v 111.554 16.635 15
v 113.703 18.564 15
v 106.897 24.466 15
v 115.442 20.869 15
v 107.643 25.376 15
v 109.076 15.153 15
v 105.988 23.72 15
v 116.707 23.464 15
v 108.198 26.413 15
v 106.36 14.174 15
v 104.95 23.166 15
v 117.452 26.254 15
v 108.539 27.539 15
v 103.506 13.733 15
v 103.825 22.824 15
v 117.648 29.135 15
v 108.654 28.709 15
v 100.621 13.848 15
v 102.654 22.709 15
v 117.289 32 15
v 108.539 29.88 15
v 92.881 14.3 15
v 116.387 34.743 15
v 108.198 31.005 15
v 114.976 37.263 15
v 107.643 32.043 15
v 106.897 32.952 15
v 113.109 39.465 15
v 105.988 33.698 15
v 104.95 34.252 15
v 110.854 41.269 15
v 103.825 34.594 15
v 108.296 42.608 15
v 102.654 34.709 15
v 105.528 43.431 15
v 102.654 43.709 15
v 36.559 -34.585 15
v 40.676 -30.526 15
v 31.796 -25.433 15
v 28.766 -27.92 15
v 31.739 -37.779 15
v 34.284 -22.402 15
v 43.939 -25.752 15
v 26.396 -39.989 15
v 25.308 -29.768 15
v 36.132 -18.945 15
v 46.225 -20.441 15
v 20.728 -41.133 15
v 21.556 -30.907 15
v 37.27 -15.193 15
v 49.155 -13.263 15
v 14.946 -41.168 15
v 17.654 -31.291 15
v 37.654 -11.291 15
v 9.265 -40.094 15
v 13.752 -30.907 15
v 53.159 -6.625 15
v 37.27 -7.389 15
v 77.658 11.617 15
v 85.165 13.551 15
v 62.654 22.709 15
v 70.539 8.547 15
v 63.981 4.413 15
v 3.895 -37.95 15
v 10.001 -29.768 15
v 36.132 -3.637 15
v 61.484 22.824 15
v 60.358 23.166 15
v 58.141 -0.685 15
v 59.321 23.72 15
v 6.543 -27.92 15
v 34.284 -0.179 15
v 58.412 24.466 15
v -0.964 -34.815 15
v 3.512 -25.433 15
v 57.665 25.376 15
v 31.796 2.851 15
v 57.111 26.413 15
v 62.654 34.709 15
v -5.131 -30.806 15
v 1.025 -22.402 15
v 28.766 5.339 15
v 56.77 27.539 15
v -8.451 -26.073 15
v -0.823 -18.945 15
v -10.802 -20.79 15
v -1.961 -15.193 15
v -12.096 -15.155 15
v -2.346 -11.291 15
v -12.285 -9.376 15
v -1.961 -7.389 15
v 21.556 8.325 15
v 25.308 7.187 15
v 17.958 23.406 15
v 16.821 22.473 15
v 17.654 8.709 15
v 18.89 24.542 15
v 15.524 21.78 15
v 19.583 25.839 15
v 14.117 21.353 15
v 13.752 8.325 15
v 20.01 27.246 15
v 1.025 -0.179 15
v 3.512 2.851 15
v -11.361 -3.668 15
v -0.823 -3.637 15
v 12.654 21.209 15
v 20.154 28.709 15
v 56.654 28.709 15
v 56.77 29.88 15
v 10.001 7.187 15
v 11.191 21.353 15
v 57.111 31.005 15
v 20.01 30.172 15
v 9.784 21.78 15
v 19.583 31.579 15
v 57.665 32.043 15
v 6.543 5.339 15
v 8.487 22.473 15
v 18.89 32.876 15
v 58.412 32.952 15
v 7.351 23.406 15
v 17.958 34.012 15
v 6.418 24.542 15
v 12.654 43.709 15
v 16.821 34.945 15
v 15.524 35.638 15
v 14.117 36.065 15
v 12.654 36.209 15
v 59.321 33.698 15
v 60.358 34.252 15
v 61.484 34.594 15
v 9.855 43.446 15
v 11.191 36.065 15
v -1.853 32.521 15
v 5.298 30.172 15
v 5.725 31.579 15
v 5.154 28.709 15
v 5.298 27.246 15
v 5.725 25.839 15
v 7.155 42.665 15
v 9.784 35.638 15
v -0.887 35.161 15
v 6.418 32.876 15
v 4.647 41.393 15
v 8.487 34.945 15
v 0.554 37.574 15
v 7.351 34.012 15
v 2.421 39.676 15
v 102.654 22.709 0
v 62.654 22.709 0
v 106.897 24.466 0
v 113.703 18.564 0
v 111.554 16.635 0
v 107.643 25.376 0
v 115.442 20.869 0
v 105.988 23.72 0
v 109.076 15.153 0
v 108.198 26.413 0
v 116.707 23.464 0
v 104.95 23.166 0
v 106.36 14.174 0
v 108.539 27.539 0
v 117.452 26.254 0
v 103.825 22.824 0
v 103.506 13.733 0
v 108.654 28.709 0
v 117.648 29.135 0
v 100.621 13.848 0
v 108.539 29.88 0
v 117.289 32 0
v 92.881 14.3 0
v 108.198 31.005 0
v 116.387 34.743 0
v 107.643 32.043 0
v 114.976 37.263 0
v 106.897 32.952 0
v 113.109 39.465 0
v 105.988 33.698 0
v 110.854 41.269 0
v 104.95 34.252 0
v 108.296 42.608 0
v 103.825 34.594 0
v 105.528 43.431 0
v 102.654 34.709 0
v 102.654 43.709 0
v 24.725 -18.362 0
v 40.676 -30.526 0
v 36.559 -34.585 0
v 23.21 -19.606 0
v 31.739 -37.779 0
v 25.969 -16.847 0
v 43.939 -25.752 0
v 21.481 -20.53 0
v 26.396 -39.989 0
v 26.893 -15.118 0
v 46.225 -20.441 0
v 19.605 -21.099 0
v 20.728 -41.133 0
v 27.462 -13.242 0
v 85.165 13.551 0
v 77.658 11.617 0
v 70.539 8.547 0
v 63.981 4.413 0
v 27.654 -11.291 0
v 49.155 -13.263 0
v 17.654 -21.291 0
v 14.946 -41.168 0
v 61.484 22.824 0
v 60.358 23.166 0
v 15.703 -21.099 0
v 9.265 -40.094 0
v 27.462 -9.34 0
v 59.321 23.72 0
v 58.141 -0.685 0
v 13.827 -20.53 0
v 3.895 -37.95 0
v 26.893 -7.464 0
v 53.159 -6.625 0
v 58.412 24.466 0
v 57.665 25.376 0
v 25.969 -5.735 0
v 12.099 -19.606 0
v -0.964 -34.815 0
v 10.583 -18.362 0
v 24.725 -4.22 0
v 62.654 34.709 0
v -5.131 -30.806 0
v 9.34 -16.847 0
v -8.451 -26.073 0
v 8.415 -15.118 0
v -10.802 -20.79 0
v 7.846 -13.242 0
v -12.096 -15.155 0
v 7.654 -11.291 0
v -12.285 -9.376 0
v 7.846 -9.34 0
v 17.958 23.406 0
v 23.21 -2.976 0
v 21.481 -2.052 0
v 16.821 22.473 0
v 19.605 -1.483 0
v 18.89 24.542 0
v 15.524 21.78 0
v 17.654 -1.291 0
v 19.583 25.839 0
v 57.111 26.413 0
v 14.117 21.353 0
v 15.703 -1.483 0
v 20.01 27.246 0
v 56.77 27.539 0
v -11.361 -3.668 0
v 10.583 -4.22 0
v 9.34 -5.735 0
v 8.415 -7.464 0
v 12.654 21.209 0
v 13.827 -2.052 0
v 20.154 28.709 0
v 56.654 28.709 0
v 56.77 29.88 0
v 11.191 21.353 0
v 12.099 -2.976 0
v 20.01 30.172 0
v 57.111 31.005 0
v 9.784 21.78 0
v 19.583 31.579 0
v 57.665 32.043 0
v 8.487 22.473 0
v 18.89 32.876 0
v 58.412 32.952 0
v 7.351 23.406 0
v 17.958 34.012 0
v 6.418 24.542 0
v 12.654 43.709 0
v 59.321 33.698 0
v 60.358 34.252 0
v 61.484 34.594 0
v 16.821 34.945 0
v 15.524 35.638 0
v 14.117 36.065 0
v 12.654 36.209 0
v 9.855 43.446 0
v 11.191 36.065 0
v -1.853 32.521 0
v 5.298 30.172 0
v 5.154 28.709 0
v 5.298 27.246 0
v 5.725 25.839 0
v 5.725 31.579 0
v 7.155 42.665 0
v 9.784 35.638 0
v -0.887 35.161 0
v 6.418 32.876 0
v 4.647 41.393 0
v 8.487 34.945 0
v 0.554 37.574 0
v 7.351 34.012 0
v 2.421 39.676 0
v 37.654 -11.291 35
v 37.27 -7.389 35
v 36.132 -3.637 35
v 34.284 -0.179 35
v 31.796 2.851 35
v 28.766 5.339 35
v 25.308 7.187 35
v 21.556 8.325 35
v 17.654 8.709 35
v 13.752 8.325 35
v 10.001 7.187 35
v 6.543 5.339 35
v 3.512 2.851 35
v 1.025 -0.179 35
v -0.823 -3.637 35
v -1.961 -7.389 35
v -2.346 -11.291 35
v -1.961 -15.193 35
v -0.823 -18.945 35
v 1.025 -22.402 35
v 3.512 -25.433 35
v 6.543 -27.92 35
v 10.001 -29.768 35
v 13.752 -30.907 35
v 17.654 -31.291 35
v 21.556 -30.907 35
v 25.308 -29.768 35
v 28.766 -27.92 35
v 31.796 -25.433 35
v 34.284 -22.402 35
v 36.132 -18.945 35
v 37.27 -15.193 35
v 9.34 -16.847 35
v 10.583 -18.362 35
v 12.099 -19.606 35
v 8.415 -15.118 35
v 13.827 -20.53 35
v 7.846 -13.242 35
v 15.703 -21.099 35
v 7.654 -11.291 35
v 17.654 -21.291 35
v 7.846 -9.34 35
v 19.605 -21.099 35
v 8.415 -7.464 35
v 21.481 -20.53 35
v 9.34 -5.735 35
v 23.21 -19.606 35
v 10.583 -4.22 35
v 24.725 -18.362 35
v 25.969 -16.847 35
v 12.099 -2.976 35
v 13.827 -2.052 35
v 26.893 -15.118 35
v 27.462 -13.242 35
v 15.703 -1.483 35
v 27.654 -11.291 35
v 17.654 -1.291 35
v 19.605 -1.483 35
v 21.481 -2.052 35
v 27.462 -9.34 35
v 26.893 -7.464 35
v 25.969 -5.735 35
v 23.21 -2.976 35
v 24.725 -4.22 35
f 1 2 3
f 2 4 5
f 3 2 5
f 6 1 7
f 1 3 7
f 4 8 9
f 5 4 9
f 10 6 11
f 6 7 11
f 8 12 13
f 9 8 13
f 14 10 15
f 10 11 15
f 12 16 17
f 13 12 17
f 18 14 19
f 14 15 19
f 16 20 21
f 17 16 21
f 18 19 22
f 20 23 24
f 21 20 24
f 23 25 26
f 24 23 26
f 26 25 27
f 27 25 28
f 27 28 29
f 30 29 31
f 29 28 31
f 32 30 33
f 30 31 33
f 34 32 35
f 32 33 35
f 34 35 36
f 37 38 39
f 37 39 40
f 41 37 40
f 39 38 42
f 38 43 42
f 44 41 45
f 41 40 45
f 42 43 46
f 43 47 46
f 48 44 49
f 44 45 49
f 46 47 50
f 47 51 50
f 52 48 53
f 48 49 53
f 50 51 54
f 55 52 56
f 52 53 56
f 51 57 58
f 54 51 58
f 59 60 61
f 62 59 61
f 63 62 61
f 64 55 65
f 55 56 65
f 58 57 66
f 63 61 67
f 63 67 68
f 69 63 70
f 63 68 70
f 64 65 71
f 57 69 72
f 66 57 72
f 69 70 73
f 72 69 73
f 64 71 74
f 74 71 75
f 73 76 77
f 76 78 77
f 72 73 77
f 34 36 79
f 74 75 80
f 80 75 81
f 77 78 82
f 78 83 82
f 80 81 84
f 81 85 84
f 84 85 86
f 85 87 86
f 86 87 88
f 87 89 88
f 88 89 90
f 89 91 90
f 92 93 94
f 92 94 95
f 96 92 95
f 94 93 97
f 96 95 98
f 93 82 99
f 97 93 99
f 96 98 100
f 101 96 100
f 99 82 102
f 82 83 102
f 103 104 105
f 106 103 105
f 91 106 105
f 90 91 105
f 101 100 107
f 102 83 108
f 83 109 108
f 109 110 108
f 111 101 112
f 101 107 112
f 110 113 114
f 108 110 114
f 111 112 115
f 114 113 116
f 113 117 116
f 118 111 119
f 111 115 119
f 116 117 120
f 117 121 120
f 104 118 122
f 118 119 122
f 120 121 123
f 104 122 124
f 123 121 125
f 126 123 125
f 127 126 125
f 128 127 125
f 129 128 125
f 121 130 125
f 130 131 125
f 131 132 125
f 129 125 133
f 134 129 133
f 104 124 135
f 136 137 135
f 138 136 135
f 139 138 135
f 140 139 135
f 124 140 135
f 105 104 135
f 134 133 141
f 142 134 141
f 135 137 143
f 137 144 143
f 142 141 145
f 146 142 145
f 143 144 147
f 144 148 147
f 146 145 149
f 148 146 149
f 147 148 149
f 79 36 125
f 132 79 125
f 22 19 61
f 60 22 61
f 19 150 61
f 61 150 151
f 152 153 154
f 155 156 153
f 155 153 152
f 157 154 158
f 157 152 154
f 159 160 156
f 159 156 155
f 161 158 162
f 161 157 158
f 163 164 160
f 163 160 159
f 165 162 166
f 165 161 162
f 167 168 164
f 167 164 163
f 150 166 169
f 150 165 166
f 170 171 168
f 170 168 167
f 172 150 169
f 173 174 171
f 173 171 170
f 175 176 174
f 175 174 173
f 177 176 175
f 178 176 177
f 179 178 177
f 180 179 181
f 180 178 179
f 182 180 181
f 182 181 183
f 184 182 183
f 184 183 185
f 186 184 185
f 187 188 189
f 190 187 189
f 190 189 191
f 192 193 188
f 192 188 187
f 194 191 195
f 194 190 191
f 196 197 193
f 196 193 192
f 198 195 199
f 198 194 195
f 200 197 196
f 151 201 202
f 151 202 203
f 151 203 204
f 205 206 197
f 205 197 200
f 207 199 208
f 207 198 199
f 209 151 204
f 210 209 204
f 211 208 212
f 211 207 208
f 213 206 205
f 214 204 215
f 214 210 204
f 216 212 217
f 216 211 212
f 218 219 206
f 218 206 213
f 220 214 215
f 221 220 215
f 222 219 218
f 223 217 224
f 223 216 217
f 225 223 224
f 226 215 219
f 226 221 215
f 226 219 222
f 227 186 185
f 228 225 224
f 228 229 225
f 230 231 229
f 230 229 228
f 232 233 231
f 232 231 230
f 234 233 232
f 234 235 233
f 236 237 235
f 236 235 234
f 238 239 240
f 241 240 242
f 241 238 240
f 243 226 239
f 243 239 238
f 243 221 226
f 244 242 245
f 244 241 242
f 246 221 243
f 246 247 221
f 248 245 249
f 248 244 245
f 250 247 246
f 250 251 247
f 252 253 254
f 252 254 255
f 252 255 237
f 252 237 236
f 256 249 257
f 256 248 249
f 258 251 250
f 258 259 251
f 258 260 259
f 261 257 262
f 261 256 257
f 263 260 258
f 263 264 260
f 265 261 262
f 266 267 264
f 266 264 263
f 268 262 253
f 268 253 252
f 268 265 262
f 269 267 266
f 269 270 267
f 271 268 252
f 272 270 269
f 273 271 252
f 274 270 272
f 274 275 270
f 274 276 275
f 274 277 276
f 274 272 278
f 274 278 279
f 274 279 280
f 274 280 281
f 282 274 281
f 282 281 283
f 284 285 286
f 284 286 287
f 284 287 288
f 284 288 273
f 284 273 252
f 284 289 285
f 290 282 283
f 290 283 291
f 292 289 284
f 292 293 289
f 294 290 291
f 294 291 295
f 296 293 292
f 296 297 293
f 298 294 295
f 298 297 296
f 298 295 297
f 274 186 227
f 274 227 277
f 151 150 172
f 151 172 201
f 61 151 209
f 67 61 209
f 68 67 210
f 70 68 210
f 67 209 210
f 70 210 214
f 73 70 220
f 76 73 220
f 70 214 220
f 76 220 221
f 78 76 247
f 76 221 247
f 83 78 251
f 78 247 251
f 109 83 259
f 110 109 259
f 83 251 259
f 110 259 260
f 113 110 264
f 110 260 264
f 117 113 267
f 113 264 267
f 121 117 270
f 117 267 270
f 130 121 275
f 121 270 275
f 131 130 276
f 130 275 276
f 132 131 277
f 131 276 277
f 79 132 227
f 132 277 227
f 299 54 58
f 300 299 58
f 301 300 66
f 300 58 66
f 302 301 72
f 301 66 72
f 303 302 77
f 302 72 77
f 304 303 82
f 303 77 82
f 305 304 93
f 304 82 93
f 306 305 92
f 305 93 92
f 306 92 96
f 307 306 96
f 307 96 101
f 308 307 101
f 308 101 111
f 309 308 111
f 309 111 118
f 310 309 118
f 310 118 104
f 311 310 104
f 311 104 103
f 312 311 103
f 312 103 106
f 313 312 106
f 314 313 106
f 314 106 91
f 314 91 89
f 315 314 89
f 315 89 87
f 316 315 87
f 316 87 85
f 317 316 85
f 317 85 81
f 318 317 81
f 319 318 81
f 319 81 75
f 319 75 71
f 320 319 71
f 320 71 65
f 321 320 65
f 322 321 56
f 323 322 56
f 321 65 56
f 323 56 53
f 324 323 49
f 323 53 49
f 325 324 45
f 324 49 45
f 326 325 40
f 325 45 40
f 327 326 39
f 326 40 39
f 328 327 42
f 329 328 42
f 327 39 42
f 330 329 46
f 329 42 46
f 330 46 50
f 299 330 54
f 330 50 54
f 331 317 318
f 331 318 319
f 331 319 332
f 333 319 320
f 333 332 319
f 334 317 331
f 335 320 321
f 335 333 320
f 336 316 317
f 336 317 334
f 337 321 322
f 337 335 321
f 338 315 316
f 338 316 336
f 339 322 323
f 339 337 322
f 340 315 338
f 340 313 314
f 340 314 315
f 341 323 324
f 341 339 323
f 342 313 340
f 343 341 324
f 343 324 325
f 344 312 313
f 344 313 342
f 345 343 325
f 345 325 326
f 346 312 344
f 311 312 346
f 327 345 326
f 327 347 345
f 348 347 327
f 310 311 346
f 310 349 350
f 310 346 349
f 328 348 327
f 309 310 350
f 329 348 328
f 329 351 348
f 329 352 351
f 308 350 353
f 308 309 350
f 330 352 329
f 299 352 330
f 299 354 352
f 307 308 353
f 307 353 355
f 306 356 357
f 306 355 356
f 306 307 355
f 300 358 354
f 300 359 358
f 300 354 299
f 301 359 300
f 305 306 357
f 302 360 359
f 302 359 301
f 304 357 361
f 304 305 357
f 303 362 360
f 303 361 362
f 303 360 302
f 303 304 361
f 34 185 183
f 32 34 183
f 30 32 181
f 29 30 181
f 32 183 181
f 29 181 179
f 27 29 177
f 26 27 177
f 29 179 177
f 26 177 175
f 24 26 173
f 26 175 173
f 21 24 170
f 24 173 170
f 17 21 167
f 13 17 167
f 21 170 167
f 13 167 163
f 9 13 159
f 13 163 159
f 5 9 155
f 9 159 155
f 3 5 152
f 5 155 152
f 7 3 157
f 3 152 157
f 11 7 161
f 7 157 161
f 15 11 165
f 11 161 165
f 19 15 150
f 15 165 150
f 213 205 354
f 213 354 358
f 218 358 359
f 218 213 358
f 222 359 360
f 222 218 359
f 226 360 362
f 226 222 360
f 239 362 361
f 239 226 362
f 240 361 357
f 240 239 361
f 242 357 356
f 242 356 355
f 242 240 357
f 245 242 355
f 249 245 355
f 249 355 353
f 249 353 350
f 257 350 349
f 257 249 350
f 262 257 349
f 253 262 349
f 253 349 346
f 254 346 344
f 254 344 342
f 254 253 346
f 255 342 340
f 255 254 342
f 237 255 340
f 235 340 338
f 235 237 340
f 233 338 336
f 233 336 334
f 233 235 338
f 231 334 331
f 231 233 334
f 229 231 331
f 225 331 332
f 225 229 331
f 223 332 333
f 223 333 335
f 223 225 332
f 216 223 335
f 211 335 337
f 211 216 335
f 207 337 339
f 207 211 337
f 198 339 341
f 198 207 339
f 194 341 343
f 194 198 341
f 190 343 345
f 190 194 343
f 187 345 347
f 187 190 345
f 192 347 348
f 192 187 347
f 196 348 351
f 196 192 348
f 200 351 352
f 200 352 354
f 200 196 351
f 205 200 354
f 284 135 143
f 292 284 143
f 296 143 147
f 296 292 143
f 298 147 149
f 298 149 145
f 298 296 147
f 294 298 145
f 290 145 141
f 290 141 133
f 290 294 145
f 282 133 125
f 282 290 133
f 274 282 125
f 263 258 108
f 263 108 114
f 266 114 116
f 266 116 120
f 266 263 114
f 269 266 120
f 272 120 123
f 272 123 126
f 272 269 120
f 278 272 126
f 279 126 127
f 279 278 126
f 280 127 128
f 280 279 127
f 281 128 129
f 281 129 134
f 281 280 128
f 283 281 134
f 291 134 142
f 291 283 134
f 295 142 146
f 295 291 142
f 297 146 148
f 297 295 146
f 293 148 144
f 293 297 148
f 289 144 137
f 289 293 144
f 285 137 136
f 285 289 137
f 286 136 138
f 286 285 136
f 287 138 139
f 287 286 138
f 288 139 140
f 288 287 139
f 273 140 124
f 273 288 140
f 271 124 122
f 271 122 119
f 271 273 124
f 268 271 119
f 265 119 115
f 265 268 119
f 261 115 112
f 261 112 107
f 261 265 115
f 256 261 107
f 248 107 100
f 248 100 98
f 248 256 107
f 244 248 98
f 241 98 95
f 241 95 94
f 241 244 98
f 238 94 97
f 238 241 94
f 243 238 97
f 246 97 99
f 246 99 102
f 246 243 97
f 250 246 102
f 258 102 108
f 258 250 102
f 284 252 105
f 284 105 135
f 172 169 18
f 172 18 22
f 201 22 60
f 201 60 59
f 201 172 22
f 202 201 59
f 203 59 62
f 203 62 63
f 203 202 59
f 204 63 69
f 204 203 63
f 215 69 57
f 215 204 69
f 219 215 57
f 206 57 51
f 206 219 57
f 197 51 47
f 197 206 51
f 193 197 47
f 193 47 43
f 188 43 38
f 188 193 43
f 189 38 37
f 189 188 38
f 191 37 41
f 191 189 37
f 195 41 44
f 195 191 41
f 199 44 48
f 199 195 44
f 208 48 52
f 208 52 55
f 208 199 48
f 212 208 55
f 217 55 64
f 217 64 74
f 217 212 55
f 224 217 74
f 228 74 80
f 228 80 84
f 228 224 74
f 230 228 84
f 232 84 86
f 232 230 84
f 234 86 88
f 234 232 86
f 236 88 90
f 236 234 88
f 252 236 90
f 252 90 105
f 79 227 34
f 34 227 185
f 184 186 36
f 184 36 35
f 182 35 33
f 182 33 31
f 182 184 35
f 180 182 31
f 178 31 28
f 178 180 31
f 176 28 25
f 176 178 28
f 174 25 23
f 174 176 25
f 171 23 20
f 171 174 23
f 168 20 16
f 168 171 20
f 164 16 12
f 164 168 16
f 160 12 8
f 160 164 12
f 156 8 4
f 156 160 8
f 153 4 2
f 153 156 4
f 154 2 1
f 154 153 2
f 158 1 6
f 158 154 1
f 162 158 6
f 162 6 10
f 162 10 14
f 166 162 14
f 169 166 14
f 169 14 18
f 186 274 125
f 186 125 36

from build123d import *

# Parameters (mm, degrees)
SKETCH1_R           = 7.5
SKETCH1_R_2         = 20
BOSS_EXTRUDE3_DEPTH = 15
SKETCH1_9_R         = 20
SKETCH1_9_R_2       = 10
BOSS_EXTRUDE4_DEPTH = 35


with BuildPart() as part:
    # Sketch1 → Boss-Extrude3 (new body)
    with BuildSketch(Plane.XY):
        with BuildLine():
            Line((-11.361079264, -3.667783279), (-1.853421221, 32.520673976))
            ThreePointArc((-1.853421221, 32.520673976), (3.493809463, 40.587118039), (12.654236823, 43.709131232))
            Line((12.654236823, 43.709131232), (102.654236823, 43.709131232))
            ThreePointArc((102.654236823, 43.709131232), (117.619577951, 27.690031183), (100.620746174, 13.847606553))
            ThreePointArc((100.620746174, 13.847606553), (67.179976661, 6.607096754), (46.224814518, -20.440846371))
            ThreePointArc((46.224814518, -20.440846371), (9.264757731, -40.093935282), (-11.361079264, -3.667783279))
        make_face()
        with Locations((12.654236823, 28.709131232)):
            Circle(SKETCH1_R, mode=Mode.SUBTRACT)
        with Locations((17.654236823, -11.290868768)):
            Circle(SKETCH1_R_2, mode=Mode.SUBTRACT)
        with BuildLine():
            Line((62.654236823, 34.709131232), (102.654236823, 34.709131232))
            ThreePointArc((102.654236823, 34.709131232), (108.654236823, 28.709131232), (102.654236823, 22.709131232))
            Line((102.654236823, 22.709131232), (62.654236823, 22.709131232))
            ThreePointArc((62.654236823, 22.709131232), (56.654236823, 28.709131232), (62.654236823, 34.709131232))
        make_face(mode=Mode.SUBTRACT)
    extrude(amount=BOSS_EXTRUDE3_DEPTH)

    # Sketch1<9> → Boss-Extrude4 (add)
    with BuildSketch(Plane.XY):
        with Locations((17.654236823, -11.290868768)):
            Circle(SKETCH1_9_R)
        with Locations((17.654236823, -11.290868768)):
            Circle(SKETCH1_9_R_2, mode=Mode.SUBTRACT)
    extrude(amount=BOSS_EXTRUDE4_DEPTH)


solid = part.part
